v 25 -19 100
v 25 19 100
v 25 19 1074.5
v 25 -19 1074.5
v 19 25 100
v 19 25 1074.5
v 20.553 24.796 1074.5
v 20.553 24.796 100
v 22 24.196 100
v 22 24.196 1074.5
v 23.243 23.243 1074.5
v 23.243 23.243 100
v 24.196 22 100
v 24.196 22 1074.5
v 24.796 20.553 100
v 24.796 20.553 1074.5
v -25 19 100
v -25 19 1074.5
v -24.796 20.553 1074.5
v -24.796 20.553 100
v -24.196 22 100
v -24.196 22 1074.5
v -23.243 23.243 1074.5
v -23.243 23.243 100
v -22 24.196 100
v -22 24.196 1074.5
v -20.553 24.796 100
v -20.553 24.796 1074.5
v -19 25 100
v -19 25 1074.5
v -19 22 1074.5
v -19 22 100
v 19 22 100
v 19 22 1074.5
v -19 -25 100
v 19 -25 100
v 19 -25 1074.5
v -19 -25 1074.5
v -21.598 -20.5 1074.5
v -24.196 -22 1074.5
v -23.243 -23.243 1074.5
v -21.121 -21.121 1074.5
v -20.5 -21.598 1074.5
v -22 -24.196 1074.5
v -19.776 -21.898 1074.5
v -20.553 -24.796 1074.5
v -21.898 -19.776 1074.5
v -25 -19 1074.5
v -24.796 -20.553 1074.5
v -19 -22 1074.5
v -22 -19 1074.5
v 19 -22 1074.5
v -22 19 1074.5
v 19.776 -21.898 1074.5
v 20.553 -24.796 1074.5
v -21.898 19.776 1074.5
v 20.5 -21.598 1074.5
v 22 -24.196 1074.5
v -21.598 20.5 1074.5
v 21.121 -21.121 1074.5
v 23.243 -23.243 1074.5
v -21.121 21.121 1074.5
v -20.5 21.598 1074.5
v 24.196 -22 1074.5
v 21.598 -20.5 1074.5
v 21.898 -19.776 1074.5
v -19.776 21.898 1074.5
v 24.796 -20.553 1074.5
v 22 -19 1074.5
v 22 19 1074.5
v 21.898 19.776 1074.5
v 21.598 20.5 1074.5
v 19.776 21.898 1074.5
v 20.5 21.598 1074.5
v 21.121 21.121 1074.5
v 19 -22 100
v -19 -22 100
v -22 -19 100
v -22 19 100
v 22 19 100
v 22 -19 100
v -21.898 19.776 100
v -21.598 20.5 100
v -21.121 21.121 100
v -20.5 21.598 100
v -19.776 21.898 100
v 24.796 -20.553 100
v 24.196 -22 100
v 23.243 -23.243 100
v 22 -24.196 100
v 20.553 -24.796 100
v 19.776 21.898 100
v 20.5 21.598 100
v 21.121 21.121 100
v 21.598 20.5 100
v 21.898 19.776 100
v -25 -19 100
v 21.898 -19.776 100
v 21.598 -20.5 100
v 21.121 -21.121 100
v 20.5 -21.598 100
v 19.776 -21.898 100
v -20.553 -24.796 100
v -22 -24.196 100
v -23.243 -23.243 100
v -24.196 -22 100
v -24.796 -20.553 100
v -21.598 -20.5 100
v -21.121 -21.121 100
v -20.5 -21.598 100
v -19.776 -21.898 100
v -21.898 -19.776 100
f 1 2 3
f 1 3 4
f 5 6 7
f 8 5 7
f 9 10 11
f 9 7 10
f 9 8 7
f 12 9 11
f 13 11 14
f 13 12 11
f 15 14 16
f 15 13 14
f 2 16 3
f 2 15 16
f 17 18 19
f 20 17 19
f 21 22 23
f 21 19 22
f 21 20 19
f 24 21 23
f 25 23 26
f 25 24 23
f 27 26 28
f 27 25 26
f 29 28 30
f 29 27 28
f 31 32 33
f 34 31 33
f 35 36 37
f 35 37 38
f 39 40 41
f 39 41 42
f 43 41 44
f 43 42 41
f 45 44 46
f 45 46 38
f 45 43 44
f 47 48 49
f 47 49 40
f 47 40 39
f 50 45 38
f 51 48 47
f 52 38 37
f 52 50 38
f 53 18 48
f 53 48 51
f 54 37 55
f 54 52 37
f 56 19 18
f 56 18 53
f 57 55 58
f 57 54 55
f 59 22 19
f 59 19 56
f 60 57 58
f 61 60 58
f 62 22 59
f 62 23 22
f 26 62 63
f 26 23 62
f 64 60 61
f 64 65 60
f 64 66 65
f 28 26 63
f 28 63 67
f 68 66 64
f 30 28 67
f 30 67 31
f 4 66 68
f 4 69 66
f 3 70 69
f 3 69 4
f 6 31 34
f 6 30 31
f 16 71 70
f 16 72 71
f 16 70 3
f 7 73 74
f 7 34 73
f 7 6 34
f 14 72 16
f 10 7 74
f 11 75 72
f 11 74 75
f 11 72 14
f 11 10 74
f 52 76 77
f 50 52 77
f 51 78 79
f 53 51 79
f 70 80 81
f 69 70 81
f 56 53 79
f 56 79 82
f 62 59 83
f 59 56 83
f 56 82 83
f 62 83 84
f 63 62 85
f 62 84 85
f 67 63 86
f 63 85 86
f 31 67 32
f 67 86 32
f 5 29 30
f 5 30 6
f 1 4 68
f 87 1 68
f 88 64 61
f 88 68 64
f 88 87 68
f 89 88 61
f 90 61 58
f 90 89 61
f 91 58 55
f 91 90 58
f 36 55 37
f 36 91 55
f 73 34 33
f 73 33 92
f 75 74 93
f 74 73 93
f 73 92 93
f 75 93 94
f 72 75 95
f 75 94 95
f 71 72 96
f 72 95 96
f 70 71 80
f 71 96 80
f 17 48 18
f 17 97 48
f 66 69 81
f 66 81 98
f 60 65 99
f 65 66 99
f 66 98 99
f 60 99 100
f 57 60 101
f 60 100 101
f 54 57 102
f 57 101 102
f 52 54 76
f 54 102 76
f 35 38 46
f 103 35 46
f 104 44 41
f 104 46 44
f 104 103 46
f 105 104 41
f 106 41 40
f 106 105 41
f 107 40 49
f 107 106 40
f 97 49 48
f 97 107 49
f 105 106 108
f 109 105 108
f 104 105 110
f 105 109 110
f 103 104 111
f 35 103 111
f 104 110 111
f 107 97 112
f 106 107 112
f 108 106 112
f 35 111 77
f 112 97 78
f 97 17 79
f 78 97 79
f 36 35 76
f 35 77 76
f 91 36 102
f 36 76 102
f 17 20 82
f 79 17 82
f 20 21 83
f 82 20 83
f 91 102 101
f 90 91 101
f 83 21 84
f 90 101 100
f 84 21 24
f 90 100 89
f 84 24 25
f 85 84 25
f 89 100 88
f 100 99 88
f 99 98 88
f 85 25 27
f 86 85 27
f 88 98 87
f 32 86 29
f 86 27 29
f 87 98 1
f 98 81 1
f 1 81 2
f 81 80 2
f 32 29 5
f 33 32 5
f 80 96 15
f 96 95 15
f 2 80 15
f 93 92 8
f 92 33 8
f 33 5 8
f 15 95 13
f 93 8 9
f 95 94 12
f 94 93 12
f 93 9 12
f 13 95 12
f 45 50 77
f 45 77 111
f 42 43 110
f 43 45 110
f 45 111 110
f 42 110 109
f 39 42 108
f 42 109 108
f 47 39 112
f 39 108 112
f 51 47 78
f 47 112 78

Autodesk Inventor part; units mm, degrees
ref_plane "YZ Plane" through (0, 0, 0) normal (1, 0, 0) x (0, 1, 0)
ref_plane "Start Plane" through (0, 0, 100) normal (0, 0, 1) x (1, 0, 0)
ref_plane "End Plane" through (0, 0, 1074.5) normal (0, 0, 1) x (1, 0, 0)
sketch "Sketch" plane through (0, 0, 0) normal (0, 0, 1) x (1, 0, 0)
  line L0 (-25, -19) -> (-25, 19)
  line L1 (-19, 25) -> (19, 25)
  line L2 (25, 19) -> (25, -19)
  line L3 (19, -25) -> (-19, -25)
  arc A0 (-25, -19) -> (-19, -25) centre (-19, -19) ccw
  arc A1 (25, 19) -> (19, 25) centre (19, 19) ccw
  arc A2 (-19, 25) -> (-25, 19) centre (-19, 19) ccw
  arc A3 (19, -25) -> (25, -19) centre (19, -19) ccw
  arc A4 (-19, 22) -> (-22, 19) centre (-19, 19) ccw
  line L4 (-19, 22) -> (19, 22)
  arc A5 (22, 19) -> (19, 22) centre (19, 19) ccw
  line L5 (22, 19) -> (22, -19)
  arc A6 (19, -22) -> (22, -19) centre (19, -19) ccw
  line L6 (19, -22) -> (-19, -22)
  arc A7 (-22, -19) -> (-19, -22) centre (-19, -19) ccw
  line L7 (-22, -19) -> (-22, 19)
  line L8 (0, 36.7397) -> (0, -36.7397) construction
  line L9 (-36.7397, 0) -> (36.7397, 0) construction
  dimension "d7" = 6
  dimension "d9" = 50
  dimension "d11" = 50
  dimension "d12" = 3
  dimension "d15" = 25
  dimension "d16" = 25
extrude "Body" add sketch "Sketch" along normal up to surface (974.5 mm away) from surface at 100
sketch "Sketch3" plane through (0, 0, 0) normal (0, 0, 1) x (1, 0, 0)
  line L0 (0, 0) -> (10, 0)
ref_plane "Work Plane3" through (0, 0, 0) normal (0, -1, 0) x (1, 0, 0)
sketch "Sketch4" plane through (0, 0, 0) normal (0, -1, 0) x (1, 0, 0)
  line L0 (-2, 100) -> (12, 100) projected
  line L1 (-2, 1074.5) -> (12, 1074.5) projected
  dimension "d18" = 974.5
equation "\"d7\" = G_IR"
equation "\"d9\" = G_W"
equation "\"d11\" = G_H"
equation "\"d12\" = G_T"
equation "\"d15\" = 0.5 * d9"
equation "\"d16\" = 0.5 * d11"
equation "\"d3\" = G_L"
equation "\"G_W\" = 50"
equation "\"G_H\" = 50"
equation "\"G_T\" = 3"
equation "\"G_IR\" = 6"
equation "\"G_L\" = d18"
equation "\"G_OFFSET_END\" = 0"
equation "\"d14\" = G_OFFSET_END + B_L"
equation "\"B_L\" = 1074.5"
properties part number "ISO 4019 - 50x50x3 - 974.5" material "Steel, Mild"
